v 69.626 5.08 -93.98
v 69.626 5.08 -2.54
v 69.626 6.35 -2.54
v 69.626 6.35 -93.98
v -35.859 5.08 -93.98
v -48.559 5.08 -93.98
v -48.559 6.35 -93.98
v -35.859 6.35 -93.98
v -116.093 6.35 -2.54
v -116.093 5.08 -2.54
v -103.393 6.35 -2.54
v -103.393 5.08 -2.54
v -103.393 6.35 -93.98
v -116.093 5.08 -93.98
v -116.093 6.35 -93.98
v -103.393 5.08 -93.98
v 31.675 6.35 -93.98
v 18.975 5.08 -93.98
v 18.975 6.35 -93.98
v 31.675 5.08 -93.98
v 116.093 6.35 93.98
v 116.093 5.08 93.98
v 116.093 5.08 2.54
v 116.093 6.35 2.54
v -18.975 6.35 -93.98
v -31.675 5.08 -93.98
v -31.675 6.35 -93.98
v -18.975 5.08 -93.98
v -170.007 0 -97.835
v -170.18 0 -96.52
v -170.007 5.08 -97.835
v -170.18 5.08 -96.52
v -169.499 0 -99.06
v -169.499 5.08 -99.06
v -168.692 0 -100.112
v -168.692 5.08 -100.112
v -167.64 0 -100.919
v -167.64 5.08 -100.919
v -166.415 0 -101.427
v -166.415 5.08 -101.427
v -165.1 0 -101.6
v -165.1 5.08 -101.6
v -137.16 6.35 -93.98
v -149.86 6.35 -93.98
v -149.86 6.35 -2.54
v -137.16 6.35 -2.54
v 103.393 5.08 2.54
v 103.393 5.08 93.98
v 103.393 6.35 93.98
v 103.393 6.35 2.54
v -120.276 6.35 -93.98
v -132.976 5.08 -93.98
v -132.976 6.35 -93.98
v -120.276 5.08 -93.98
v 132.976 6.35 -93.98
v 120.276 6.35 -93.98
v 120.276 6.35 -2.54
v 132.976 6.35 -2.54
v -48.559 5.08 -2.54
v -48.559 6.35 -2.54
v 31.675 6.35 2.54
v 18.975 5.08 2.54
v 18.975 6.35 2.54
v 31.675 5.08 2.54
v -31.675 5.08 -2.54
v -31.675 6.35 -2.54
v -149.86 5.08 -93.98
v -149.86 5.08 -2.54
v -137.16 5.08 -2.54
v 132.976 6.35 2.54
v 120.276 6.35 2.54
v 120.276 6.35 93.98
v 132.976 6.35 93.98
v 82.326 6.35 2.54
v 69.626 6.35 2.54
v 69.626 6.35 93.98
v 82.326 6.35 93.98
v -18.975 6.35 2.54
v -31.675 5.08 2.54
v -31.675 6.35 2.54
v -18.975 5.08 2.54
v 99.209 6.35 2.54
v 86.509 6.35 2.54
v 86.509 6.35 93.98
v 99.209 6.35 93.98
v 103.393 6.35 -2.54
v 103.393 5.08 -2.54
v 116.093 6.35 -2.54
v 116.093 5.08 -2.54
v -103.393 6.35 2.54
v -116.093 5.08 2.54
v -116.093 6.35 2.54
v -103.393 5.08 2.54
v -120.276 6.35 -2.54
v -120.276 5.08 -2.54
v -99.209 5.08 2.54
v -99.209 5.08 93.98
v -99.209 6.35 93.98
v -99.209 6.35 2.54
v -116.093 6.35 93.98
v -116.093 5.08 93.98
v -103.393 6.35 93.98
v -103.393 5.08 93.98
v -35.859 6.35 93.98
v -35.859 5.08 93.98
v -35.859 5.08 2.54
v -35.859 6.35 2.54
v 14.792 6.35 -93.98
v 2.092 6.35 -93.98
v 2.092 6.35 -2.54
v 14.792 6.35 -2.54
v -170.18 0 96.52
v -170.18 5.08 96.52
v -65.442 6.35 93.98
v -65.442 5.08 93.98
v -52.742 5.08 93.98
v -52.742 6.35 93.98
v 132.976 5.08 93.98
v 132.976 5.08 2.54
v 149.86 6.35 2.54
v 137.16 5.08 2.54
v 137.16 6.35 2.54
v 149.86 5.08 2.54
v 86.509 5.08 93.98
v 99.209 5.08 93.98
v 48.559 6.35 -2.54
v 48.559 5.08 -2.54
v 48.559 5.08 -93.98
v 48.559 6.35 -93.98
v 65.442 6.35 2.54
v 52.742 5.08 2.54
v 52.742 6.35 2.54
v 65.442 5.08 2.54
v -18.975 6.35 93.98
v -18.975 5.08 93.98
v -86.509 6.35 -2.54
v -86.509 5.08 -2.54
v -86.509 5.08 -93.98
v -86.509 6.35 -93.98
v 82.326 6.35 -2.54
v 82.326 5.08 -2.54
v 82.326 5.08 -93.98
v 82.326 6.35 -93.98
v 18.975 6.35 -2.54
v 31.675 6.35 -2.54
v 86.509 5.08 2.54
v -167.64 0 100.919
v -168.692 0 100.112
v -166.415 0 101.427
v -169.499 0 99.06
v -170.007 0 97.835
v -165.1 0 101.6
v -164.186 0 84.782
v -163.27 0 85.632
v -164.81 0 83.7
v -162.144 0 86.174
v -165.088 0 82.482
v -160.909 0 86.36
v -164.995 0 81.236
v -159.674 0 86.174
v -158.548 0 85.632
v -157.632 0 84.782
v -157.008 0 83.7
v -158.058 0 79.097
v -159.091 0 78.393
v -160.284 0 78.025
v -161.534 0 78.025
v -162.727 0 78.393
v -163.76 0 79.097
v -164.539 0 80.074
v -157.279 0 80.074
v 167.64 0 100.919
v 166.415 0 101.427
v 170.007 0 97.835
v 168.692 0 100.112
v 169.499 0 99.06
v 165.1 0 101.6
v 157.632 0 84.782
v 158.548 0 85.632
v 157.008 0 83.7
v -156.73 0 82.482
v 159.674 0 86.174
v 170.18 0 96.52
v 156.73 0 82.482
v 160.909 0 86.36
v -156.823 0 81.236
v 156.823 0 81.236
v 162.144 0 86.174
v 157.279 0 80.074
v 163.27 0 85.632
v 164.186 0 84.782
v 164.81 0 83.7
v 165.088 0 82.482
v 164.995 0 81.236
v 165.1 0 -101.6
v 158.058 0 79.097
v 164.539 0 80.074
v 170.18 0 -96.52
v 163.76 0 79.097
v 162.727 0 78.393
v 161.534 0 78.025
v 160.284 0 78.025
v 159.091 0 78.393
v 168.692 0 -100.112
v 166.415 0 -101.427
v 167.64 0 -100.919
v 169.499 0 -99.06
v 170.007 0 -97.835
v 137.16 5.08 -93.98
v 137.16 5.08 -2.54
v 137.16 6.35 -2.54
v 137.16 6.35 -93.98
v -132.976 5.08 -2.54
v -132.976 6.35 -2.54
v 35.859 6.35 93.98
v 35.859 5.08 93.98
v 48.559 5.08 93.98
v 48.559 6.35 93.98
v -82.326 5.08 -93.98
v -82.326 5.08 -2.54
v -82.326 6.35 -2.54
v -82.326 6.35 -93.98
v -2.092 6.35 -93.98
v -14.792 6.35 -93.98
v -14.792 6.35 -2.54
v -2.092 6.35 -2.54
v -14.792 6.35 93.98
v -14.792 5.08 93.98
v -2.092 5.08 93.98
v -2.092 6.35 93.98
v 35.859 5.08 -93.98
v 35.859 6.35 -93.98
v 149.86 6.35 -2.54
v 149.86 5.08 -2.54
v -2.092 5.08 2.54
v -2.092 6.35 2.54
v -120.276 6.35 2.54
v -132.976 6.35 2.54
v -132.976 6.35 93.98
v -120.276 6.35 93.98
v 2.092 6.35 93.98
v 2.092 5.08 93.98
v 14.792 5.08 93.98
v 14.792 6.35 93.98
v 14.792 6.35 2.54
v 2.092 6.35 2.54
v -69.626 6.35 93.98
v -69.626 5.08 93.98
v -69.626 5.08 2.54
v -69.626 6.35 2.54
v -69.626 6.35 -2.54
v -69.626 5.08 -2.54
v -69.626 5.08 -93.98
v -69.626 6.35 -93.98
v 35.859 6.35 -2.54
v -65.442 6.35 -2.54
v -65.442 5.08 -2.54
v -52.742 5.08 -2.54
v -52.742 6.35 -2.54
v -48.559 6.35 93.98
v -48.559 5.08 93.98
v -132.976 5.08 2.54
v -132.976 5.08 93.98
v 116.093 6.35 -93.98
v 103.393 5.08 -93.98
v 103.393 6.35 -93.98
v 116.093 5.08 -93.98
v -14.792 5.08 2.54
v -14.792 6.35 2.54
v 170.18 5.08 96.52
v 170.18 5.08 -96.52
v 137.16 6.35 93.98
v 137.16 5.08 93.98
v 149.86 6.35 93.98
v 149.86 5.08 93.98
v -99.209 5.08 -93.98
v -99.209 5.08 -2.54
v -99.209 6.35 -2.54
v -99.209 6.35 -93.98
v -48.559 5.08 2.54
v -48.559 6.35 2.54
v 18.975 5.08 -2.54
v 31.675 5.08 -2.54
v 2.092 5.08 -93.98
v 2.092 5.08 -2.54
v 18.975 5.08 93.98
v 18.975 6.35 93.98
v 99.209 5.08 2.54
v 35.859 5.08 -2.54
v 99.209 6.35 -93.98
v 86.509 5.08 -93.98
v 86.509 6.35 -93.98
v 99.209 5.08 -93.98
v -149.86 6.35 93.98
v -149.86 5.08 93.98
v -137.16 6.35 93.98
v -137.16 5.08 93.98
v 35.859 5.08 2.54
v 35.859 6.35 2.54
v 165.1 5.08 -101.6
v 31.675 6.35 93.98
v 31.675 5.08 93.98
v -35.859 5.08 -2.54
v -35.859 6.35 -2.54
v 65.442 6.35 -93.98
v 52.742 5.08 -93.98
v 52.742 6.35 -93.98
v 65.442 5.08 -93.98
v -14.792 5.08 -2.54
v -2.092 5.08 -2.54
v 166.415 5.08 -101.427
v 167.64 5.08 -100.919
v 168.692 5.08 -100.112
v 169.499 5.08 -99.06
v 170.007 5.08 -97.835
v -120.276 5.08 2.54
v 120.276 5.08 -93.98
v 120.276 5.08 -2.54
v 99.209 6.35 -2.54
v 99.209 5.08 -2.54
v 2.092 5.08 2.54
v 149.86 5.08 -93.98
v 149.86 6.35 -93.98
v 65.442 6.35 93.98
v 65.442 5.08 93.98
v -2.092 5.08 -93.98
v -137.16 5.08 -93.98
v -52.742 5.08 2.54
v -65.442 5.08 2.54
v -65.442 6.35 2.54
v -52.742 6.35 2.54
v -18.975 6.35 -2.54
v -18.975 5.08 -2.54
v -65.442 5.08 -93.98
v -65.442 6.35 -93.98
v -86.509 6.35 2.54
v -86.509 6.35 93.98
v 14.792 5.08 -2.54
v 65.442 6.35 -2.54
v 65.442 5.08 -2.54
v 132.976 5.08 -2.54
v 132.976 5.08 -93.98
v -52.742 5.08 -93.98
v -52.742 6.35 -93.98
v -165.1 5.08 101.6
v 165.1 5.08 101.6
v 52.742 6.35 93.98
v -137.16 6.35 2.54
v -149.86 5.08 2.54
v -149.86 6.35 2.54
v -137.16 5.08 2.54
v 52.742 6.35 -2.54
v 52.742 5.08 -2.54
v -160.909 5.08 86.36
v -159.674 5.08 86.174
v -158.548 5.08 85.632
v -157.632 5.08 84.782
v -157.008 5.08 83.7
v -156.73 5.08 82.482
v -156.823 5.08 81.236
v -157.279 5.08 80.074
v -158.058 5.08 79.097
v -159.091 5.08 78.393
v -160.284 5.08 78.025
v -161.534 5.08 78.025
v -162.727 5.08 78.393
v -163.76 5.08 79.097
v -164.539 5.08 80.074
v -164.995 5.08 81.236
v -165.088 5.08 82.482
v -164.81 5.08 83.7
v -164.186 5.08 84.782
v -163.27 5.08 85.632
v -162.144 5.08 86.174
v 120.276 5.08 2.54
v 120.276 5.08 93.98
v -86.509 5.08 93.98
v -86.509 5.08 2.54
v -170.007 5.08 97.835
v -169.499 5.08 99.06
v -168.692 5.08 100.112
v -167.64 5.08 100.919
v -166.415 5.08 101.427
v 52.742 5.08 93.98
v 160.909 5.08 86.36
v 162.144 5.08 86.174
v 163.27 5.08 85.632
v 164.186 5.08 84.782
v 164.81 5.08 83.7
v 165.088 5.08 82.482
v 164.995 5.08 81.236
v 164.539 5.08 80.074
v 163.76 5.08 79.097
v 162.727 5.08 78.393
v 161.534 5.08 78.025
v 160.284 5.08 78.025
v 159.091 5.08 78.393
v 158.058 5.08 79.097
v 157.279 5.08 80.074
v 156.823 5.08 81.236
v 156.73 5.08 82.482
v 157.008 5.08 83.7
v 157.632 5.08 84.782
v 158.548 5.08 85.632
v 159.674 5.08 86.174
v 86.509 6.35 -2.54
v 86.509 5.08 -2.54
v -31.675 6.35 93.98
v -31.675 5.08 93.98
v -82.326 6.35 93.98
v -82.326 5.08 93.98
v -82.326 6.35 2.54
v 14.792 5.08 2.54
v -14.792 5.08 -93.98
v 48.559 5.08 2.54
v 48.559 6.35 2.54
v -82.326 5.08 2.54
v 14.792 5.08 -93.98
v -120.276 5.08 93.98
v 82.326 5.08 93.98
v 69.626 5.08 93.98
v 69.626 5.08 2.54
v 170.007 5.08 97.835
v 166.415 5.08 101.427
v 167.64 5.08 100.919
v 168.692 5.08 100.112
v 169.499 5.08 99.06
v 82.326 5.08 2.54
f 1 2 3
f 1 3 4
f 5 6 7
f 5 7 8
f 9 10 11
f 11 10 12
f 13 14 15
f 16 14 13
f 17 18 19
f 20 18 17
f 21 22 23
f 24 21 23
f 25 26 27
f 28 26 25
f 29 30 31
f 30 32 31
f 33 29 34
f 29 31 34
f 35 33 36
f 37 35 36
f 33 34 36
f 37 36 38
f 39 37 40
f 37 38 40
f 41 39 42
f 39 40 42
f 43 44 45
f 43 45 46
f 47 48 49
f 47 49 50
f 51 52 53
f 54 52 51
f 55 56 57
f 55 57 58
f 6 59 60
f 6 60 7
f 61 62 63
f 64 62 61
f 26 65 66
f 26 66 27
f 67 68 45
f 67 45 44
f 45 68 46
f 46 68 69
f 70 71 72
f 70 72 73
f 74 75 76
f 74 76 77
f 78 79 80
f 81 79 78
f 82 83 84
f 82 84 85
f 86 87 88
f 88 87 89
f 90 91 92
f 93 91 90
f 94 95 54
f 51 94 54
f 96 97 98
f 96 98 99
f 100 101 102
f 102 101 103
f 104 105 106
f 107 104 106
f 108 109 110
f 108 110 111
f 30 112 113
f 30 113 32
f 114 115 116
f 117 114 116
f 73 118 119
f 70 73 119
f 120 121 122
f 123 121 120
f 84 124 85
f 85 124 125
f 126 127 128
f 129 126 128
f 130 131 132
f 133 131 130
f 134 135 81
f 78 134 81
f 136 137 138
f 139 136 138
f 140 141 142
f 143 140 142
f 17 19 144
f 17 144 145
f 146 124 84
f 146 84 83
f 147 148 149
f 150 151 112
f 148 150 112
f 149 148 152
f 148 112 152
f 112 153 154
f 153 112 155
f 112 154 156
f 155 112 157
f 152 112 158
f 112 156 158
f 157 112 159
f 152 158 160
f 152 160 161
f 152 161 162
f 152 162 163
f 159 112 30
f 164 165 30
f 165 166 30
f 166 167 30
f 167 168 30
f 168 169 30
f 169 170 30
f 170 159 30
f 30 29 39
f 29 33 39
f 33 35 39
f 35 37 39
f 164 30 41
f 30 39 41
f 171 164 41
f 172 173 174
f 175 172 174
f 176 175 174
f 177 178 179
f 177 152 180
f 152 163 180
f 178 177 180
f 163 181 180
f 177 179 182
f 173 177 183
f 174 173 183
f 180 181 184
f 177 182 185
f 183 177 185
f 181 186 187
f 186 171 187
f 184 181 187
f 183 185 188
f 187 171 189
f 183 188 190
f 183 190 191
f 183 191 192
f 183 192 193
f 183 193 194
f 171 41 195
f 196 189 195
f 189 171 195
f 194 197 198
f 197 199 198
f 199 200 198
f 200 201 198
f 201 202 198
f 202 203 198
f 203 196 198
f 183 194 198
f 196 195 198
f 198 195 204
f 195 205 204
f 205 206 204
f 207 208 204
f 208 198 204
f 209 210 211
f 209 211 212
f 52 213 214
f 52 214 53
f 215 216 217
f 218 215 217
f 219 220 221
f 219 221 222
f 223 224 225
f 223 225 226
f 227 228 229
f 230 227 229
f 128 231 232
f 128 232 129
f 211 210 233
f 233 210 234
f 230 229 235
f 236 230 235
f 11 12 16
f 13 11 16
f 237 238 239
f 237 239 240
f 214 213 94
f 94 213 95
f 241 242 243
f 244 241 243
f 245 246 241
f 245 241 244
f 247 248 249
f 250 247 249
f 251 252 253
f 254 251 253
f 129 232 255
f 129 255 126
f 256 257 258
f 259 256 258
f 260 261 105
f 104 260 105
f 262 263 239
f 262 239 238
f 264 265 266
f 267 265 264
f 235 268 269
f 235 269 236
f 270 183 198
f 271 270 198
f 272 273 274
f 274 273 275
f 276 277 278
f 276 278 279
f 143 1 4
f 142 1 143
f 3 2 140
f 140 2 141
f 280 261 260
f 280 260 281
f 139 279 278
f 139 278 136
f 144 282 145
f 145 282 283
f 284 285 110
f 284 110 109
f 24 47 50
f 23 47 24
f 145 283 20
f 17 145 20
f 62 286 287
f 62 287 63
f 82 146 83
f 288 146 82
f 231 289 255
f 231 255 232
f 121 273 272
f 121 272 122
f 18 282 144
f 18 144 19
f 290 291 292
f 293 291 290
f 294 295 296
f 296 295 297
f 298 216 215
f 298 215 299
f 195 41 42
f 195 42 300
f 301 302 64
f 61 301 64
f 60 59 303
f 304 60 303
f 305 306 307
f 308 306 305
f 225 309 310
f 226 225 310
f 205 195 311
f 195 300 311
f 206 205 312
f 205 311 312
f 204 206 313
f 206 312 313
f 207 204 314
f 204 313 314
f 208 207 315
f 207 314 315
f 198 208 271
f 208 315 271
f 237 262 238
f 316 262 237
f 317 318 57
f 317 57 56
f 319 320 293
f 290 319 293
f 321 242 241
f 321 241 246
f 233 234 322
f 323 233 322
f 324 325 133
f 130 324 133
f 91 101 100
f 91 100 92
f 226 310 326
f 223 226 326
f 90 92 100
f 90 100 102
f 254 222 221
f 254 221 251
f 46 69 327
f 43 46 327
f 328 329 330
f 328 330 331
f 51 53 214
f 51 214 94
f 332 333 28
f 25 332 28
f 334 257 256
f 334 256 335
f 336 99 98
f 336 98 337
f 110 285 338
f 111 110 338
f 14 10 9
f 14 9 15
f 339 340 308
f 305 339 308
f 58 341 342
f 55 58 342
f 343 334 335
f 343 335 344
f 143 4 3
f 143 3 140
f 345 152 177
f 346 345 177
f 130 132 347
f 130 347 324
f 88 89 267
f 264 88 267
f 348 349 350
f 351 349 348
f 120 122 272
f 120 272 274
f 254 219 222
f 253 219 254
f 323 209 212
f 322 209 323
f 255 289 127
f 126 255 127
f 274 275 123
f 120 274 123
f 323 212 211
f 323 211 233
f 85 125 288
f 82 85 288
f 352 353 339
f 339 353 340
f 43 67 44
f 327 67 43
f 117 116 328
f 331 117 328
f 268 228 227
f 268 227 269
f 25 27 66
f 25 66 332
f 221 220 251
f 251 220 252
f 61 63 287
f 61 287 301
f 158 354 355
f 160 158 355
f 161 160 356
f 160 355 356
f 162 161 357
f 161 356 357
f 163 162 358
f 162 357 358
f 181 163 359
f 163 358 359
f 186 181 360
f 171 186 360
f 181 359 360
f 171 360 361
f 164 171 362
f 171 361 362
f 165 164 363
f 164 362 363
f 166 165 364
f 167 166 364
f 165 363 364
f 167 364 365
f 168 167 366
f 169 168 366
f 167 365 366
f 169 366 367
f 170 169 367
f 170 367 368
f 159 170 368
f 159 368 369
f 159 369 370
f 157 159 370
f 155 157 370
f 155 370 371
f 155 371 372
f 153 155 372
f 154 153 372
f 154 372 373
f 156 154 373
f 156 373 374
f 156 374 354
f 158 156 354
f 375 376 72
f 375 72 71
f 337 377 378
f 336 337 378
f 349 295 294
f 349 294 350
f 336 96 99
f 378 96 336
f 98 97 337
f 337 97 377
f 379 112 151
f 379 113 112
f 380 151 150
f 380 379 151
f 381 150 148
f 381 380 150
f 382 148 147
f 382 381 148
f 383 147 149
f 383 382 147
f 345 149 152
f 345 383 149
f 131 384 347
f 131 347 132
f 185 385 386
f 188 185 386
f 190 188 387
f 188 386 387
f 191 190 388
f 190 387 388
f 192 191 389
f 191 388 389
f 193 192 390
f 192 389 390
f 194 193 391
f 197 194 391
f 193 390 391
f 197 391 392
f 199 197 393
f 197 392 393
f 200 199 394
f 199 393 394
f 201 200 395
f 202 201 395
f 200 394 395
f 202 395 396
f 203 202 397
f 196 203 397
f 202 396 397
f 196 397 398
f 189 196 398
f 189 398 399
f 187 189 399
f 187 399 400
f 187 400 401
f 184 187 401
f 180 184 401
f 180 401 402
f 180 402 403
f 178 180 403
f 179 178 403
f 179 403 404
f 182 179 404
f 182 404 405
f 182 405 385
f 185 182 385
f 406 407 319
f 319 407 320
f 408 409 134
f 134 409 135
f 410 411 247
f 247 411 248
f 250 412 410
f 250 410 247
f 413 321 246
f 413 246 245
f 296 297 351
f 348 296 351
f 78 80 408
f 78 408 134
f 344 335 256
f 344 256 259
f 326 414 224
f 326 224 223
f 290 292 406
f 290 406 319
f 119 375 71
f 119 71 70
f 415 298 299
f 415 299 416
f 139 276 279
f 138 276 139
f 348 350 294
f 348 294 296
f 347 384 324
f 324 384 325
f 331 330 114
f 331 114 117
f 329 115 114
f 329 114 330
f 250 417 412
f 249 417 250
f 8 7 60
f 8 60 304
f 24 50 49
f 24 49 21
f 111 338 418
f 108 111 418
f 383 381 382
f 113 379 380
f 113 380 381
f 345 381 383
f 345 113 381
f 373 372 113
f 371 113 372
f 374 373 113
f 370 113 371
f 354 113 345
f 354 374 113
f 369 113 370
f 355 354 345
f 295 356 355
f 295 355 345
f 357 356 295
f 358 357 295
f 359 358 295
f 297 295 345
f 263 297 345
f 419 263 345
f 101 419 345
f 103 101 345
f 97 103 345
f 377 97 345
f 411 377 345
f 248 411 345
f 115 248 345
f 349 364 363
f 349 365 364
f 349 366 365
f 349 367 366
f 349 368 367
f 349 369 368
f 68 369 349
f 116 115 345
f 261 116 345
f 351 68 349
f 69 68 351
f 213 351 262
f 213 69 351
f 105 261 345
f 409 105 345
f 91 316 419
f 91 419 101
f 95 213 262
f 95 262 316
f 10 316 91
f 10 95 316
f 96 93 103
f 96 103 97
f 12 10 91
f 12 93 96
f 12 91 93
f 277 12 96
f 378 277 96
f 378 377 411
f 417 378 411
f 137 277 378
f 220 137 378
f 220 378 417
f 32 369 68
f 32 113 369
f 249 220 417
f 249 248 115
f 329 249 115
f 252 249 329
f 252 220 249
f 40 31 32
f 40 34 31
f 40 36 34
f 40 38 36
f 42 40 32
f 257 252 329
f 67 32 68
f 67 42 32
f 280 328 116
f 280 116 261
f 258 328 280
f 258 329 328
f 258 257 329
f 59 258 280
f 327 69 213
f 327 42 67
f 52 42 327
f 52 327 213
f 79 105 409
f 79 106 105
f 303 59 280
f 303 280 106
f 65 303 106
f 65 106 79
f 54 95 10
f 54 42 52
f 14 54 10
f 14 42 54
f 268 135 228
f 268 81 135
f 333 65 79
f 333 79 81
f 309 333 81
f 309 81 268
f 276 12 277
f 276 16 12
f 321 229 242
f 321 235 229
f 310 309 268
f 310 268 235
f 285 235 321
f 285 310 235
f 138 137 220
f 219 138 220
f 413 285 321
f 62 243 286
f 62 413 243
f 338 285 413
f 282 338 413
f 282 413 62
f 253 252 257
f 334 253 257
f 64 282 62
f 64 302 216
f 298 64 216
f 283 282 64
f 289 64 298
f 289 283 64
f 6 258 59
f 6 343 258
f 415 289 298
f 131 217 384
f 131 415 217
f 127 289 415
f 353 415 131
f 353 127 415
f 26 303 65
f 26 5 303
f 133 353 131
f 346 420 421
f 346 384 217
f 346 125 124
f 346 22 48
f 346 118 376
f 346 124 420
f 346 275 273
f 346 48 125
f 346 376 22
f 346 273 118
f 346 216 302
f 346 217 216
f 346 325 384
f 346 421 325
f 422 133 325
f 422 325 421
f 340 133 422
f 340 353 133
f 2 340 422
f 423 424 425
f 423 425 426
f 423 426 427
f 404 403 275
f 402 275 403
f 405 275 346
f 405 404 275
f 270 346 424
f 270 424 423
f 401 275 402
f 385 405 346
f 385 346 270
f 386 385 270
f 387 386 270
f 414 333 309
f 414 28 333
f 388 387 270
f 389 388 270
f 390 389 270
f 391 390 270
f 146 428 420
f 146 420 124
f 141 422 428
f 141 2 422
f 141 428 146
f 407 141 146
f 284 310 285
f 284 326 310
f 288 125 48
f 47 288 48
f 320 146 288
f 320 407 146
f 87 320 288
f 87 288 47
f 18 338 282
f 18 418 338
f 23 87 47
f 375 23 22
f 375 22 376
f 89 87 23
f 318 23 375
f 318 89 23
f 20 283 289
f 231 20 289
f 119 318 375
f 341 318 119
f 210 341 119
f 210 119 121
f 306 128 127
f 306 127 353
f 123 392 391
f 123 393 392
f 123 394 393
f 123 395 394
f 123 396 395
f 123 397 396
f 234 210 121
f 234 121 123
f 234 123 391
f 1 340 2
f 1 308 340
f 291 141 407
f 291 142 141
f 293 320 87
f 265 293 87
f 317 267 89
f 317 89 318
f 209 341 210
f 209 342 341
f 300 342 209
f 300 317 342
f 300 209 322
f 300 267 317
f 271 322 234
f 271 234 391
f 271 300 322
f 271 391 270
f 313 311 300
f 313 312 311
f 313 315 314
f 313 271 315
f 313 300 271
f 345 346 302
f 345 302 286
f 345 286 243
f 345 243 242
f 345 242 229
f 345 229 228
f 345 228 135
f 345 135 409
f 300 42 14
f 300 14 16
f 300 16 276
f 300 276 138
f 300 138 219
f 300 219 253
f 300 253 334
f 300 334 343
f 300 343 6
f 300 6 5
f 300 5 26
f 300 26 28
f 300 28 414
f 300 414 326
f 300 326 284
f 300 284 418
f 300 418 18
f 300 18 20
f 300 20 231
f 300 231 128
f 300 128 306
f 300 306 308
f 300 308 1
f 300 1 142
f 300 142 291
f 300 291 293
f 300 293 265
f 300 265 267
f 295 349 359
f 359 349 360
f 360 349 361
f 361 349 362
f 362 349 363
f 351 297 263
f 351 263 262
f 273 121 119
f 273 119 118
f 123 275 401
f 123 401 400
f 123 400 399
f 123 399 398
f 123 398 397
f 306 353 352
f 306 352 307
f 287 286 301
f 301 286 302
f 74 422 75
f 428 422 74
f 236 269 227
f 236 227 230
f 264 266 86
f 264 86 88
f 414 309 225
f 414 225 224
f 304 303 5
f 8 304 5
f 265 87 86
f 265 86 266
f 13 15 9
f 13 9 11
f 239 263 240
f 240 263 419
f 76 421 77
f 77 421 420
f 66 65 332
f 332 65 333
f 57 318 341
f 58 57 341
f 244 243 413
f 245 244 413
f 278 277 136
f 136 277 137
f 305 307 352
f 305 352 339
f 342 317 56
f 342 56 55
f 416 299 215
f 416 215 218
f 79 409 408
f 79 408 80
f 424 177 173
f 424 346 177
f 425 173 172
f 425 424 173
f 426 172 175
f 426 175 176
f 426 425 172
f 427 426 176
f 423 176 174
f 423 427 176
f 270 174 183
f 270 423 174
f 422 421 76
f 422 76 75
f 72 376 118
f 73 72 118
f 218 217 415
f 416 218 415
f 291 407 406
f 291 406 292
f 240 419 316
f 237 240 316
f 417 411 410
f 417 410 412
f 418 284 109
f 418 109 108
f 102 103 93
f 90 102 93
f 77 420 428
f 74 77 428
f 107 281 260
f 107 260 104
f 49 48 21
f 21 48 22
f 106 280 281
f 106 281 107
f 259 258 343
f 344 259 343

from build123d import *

# Parameters (mm, degrees)
CROQUIS1_W              = 340.36
CROQUIS1_H              = 203.2
SALIENTE_EXTRUIR1_DEPTH = 5.08
CROQUIS2_W              = 12.7
CROQUIS2_H              = 91.44
SALIENTE_EXTRUIR2_DEPTH = 1.27
CROQUIS3_R              = 4.191
CORTAR_EXTRUIR1_DEPTH   = 10
REDONDEO1_R             = 5.08


with BuildPart() as part:
    # Croquis1 → Saliente-Extruir1 (new body)
    with BuildSketch(Plane(origin=(0, 0, 0), x_dir=(1, 0, 0), z_dir=(0, 1, 0))):
        Rectangle(CROQUIS1_W, CROQUIS1_H)
    extrude(amount=SALIENTE_EXTRUIR1_DEPTH)

    # Croquis2 → Saliente-Extruir2 (add)
    with BuildSketch(Plane(origin=(0, 5.08, 0), x_dir=(1, 0, 0), z_dir=(0, 1, 0))):
        with Locations((-143.51, 48.26)):
            Rectangle(CROQUIS2_W, CROQUIS2_H)
        with Locations((-126.626470588, 48.26)):
            Rectangle(CROQUIS2_W, CROQUIS2_H)
        with Locations((-109.742941176, 48.26)):
            Rectangle(CROQUIS2_W, CROQUIS2_H)
        with Locations((-92.859411765, 48.26)):
            Rectangle(CROQUIS2_W, CROQUIS2_H)
        with Locations((-75.975882353, 48.26)):
            Rectangle(CROQUIS2_W, CROQUIS2_H)
        with Locations((-59.092352941, 48.26)):
            Rectangle(CROQUIS2_W, CROQUIS2_H)
        with Locations((-42.208823529, 48.26)):
            Rectangle(CROQUIS2_W, CROQUIS2_H)
        with Locations((-25.325294118, 48.26)):
            Rectangle(CROQUIS2_W, CROQUIS2_H)
        with Locations((-8.441764706, 48.26)):
            Rectangle(CROQUIS2_W, CROQUIS2_H)
        with Locations((8.441764706, 48.26)):
            Rectangle(CROQUIS2_W, CROQUIS2_H)
        with Locations((25.325294118, 48.26)):
            Rectangle(CROQUIS2_W, CROQUIS2_H)
        with Locations((42.208823529, 48.26)):
            Rectangle(CROQUIS2_W, CROQUIS2_H)
        with Locations((59.092352941, 48.26)):
            Rectangle(CROQUIS2_W, CROQUIS2_H)
        with Locations((75.975882353, 48.26)):
            Rectangle(CROQUIS2_W, CROQUIS2_H)
        with Locations((92.859411765, 48.26)):
            Rectangle(CROQUIS2_W, CROQUIS2_H)
        with Locations((109.742941176, 48.26)):
            Rectangle(CROQUIS2_W, CROQUIS2_H)
        with Locations((126.626470588, 48.26)):
            Rectangle(CROQUIS2_W, CROQUIS2_H)
        with Locations((143.51, 48.26)):
            Rectangle(CROQUIS2_W, CROQUIS2_H)
        with Locations((143.51, -48.26)):
            Rectangle(CROQUIS2_W, CROQUIS2_H)
        with Locations((126.626470588, -48.26)):
            Rectangle(CROQUIS2_W, CROQUIS2_H)
        with Locations((109.742941176, -48.26)):
            Rectangle(CROQUIS2_W, CROQUIS2_H)
        with Locations((92.859411765, -48.26)):
            Rectangle(CROQUIS2_W, CROQUIS2_H)
        with Locations((75.975882353, -48.26)):
            Rectangle(CROQUIS2_W, CROQUIS2_H)
        with Locations((59.092352941, -48.26)):
            Rectangle(CROQUIS2_W, CROQUIS2_H)
        with Locations((42.208823529, -48.26)):
            Rectangle(CROQUIS2_W, CROQUIS2_H)
        with Locations((25.325294118, -48.26)):
            Rectangle(CROQUIS2_W, CROQUIS2_H)
        with Locations((8.441764706, -48.26)):
            Rectangle(CROQUIS2_W, CROQUIS2_H)
        with Locations((-8.441764706, -48.26)):
            Rectangle(CROQUIS2_W, CROQUIS2_H)
        with Locations((-25.325294118, -48.26)):
            Rectangle(CROQUIS2_W, CROQUIS2_H)
        with Locations((-42.208823529, -48.26)):
            Rectangle(CROQUIS2_W, CROQUIS2_H)
        with Locations((-59.092352941, -48.26)):
            Rectangle(CROQUIS2_W, CROQUIS2_H)
        with Locations((-75.975882353, -48.26)):
            Rectangle(CROQUIS2_W, CROQUIS2_H)
        with Locations((-92.859411765, -48.26)):
            Rectangle(CROQUIS2_W, CROQUIS2_H)
        with Locations((-109.742941176, -48.26)):
            Rectangle(CROQUIS2_W, CROQUIS2_H)
        with Locations((-126.626470588, -48.26)):
            Rectangle(CROQUIS2_W, CROQUIS2_H)
        with Locations((-143.51, -48.26)):
            Rectangle(CROQUIS2_W, CROQUIS2_H)
    extrude(amount=SALIENTE_EXTRUIR2_DEPTH)

    # Croquis3 → Cortar-Extruir1 (cut)
    with BuildSketch(Plane(origin=(0, 5.08, 0), x_dir=(1, 0, 0), z_dir=(0, 1, 0))):
        with Locations(Location((-160.909, -82.169, 0), (0, 0, 270))):
            Circle(CROQUIS3_R)
        with Locations(Location((160.909, -82.169, 0), (0, 0, 270))):
            Circle(CROQUIS3_R)
    extrude(amount=-CORTAR_EXTRUIR1_DEPTH, mode=Mode.SUBTRACT)

    # Redondeo1
    redondeo1_edges = [part.edges().sort_by_distance(p)[0] for p in [
        (-170.18, 2.54, -101.6),
        (170.18, 2.54, -101.6),
        (170.18, 2.54, 101.6),
        (-170.18, 2.54, 101.6),
    ]]
    fillet(redondeo1_edges, radius=REDONDEO1_R)


solid = part.part
